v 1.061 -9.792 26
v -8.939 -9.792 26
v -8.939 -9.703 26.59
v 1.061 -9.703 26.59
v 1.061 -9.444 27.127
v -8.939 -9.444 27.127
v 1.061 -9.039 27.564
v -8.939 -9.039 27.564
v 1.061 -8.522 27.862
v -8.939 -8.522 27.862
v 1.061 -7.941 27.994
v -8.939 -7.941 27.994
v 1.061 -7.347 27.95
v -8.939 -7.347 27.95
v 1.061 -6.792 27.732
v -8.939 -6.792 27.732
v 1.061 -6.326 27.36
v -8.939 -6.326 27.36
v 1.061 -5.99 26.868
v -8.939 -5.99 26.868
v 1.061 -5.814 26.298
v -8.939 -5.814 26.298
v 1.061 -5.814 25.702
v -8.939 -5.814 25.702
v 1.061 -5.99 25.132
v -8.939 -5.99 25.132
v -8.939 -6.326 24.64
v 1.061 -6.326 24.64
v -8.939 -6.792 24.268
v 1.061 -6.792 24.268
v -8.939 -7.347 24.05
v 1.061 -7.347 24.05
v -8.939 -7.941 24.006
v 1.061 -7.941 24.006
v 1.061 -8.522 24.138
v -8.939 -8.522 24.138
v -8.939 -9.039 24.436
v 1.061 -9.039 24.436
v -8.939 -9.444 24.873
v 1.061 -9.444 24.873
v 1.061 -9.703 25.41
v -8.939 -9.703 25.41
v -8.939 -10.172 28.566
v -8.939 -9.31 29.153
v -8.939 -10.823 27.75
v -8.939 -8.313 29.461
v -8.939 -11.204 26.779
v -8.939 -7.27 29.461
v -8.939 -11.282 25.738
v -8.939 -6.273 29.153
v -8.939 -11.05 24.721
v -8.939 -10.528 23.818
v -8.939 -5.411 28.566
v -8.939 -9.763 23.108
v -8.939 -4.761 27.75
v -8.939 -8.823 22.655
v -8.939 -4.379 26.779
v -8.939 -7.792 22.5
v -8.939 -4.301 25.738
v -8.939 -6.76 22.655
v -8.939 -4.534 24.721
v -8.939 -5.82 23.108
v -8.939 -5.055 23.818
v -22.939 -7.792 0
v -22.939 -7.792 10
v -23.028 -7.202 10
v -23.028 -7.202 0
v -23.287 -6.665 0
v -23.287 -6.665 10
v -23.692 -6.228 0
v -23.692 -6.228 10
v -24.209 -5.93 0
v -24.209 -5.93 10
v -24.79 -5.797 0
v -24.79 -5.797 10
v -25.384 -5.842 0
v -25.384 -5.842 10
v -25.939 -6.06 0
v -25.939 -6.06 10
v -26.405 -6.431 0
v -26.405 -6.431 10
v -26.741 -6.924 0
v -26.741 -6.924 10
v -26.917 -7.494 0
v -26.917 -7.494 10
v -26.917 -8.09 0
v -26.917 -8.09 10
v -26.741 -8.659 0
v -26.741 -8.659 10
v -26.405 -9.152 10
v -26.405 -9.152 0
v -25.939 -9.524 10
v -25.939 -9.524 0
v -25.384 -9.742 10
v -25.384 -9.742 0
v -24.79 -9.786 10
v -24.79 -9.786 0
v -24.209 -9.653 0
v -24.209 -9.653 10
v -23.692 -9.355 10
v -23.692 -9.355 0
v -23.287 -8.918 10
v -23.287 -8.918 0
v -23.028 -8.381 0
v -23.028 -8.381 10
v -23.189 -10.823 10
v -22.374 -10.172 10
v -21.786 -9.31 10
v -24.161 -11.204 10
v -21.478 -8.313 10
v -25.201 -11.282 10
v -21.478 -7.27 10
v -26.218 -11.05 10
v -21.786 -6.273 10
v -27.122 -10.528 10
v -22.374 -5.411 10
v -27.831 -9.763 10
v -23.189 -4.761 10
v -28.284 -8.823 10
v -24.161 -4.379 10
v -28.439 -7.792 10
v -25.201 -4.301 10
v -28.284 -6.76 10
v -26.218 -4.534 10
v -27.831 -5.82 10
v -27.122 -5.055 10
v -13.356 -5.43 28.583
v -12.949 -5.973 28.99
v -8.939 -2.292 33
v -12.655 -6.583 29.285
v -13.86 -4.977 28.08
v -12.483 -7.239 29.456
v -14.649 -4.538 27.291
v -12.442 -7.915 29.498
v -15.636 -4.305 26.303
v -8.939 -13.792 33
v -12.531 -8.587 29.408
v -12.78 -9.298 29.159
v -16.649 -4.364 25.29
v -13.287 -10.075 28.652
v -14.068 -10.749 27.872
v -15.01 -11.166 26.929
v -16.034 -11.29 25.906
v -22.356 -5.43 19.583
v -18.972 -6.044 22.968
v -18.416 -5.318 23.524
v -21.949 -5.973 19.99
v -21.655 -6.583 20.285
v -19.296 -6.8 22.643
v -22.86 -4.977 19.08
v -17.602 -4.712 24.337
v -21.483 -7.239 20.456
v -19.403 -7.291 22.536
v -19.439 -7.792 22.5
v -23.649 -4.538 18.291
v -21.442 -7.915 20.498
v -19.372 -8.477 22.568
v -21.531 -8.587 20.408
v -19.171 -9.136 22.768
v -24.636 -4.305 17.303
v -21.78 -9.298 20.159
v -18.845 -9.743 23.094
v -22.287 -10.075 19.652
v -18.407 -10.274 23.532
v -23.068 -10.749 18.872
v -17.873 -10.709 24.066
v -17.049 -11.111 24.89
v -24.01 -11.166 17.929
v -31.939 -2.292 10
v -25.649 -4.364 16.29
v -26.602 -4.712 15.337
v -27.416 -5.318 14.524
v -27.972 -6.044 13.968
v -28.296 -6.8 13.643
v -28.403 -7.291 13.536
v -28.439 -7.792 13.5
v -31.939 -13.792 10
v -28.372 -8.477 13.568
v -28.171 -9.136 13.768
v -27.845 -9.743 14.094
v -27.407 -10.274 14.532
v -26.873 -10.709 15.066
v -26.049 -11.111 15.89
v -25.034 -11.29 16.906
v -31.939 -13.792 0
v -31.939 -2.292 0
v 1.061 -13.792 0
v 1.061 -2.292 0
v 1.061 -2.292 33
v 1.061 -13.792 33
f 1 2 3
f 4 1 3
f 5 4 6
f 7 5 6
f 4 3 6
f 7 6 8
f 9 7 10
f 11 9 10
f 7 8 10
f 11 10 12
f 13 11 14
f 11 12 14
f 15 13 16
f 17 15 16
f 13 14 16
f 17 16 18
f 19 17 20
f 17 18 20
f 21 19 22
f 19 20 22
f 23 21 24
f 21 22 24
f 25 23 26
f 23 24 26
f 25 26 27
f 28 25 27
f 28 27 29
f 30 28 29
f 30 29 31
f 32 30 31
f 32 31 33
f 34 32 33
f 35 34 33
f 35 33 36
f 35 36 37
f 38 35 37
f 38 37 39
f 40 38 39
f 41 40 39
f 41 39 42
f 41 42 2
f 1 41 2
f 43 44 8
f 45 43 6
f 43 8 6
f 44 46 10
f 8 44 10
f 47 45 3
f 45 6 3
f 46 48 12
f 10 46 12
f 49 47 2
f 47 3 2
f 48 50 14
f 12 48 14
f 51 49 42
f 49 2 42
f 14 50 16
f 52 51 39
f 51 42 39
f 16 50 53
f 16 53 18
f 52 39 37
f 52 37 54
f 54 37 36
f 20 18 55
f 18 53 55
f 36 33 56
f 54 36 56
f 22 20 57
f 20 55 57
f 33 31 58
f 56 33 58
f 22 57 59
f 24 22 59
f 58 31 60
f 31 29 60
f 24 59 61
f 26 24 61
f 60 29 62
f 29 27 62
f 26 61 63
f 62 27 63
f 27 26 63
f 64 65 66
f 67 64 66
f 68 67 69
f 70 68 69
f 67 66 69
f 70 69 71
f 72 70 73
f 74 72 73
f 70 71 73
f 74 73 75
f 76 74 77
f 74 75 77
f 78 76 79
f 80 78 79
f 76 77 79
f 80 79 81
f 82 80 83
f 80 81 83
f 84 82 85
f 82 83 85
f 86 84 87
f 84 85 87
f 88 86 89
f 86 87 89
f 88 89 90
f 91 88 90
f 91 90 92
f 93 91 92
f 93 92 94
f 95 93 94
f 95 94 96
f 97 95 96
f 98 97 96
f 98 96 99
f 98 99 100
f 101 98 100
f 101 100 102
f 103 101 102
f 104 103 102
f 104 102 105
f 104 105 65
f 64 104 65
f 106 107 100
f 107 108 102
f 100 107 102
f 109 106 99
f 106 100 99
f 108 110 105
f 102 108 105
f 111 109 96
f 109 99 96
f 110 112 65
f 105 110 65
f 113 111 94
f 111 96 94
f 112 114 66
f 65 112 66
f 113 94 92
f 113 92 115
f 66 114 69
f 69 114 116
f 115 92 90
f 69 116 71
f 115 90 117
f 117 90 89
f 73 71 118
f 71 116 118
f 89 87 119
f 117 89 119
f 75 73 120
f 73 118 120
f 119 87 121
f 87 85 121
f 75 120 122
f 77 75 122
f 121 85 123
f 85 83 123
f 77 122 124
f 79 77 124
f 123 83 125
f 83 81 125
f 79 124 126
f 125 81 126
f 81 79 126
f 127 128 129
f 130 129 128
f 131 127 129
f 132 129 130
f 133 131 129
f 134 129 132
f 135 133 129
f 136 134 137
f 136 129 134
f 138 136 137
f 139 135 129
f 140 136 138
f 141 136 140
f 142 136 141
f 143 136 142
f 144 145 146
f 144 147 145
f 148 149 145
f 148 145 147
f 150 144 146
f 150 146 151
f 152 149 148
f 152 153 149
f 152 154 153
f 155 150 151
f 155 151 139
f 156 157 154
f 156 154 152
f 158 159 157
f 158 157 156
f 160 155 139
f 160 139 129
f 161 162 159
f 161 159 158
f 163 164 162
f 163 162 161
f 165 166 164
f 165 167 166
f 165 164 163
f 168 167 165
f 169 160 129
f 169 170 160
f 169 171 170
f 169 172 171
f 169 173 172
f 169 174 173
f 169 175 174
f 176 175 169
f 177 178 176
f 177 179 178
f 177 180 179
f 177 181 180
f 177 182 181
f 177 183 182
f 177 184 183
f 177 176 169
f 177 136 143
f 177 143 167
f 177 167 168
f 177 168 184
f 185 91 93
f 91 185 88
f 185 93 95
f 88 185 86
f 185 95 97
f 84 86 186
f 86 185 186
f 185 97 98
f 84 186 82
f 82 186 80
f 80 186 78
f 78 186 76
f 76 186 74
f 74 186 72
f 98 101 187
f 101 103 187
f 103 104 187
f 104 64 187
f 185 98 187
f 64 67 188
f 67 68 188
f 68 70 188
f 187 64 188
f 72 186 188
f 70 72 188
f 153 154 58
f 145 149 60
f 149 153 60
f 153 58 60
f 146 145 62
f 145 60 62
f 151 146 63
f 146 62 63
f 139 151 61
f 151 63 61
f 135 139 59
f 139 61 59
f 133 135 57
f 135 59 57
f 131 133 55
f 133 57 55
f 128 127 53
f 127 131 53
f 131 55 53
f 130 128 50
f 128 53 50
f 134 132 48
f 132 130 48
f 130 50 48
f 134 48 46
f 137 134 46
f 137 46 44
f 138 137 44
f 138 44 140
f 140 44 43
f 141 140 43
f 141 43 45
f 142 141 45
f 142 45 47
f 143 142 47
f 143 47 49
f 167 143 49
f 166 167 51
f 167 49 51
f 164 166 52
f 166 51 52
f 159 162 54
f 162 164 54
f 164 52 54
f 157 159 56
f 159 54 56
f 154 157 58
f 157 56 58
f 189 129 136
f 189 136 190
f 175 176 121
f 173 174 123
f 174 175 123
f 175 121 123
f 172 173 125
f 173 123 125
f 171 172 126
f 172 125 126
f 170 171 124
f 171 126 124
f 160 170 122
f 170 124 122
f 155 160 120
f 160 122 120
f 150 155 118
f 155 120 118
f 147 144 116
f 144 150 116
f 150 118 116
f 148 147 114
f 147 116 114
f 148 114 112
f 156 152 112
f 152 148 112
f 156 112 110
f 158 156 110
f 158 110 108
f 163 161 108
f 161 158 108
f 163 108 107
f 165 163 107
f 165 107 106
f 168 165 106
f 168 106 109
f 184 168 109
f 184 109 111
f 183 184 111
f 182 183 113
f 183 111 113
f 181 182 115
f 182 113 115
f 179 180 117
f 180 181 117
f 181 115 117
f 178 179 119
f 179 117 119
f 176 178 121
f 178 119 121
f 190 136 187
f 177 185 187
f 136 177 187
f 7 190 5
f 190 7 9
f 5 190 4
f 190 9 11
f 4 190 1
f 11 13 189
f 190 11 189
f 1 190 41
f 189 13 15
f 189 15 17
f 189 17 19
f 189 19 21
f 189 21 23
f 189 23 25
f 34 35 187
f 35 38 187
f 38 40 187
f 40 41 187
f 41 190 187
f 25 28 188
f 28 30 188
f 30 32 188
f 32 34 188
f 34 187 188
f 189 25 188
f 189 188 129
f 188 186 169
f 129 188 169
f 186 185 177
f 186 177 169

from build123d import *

# Parameters (mm, degrees)
SKETCH1_W           = 33
SKETCH1_H           = 23
BOSS_EXTRUDE1_DEPTH = 10
SKETCH2_W           = 10
SKETCH2_H           = 23
BOSS_EXTRUDE2_DEPTH = 23
SKETCH3_R           = 2
CUT_EXTRUDE1_DEPTH  = 33
SKETCH4_R           = 2
CUT_EXTRUDE2_DEPTH  = 33
BOSS_EXTRUDE3_DEPTH = 23
SKETCH6_R           = 3.5
CUT_EXTRUDE3_DEPTH  = 33
SKETCH7_R           = 3.5
CUT_EXTRUDE4_DEPTH  = 33
SKETCH8_W           = 33
SKETCH8_H           = 11.5
CUT_EXTRUDE5_DEPTH  = 53


with BuildPart() as part:
    # Sketch1 → Boss-Extrude1 (new body)
    with BuildSketch(Plane.XY):
        with Locations((-15.439393939, -2.291666667)):
            Rectangle(SKETCH1_W, SKETCH1_H)
    extrude(amount=BOSS_EXTRUDE1_DEPTH)

    # Sketch2 → Boss-Extrude2 (add)
    with BuildSketch(Plane.XY.offset(10)):
        with Locations((-3.939393939, -2.291666667)):
            Rectangle(SKETCH2_W, SKETCH2_H)
    extrude(amount=BOSS_EXTRUDE2_DEPTH)

    # Sketch3 → Cut-Extrude1 (cut)
    with BuildSketch(Plane.XY.offset(10)):
        with Locations((-24.939393939, 3.208333333)):
            Circle(SKETCH3_R)
        with Locations((-24.939393939, -7.791666667)):
            Circle(SKETCH3_R)
    extrude(amount=-CUT_EXTRUDE1_DEPTH, mode=Mode.SUBTRACT)

    # Sketch4 → Cut-Extrude2 (cut)
    with BuildSketch(Plane.ZY.offset(8.939393939)):
        with Locations(Location((26, 3.208333333, 0), (0, 0, 270))):
            Circle(SKETCH4_R)
        with Locations(Location((26, -7.791666667, 0), (0, 0, 270))):
            Circle(SKETCH4_R)
    extrude(amount=-CUT_EXTRUDE2_DEPTH, mode=Mode.SUBTRACT)

    # Sketch5 → Boss-Extrude3 (add)
    with BuildSketch(Plane(origin=(0, -13.791666667, 0), x_dir=(-1, 0, 0), z_dir=(0, -1, 0))):
        Polygon((8.939393939, -10), (8.939393939, -33), (31.939393939, -10), align=None)
    extrude(amount=-BOSS_EXTRUDE3_DEPTH)

    # Sketch6 → Cut-Extrude3 (cut)
    with BuildSketch(Plane(origin=(-8.939393939, 0, 0), x_dir=(0, 0, -1), z_dir=(1, 0, 0))):
        with Locations((-26, -7.791666667)):
            Circle(SKETCH6_R)
        with Locations((-26, 3.208333333)):
            Circle(SKETCH6_R)
    extrude(amount=-CUT_EXTRUDE3_DEPTH, mode=Mode.SUBTRACT)

    # Sketch7 → Cut-Extrude4 (cut)
    with BuildSketch(Plane(origin=(0, 0, 10), x_dir=(-1, 0, 0), z_dir=(0, 0, -1))):
        with Locations((24.939393939, -7.791666667)):
            Circle(SKETCH7_R)
        with Locations((24.939393939, 3.208333333)):
            Circle(SKETCH7_R)
    extrude(amount=-CUT_EXTRUDE4_DEPTH, mode=Mode.SUBTRACT)

    # Sketch8 → Cut-Extrude5 (cut)
    with BuildSketch(Plane.ZY.offset(31.939393939)):
        with Locations((16.5, 3.458333333)):
            Rectangle(SKETCH8_W, SKETCH8_H)
    extrude(amount=-CUT_EXTRUDE5_DEPTH, mode=Mode.SUBTRACT)


solid = part.part
